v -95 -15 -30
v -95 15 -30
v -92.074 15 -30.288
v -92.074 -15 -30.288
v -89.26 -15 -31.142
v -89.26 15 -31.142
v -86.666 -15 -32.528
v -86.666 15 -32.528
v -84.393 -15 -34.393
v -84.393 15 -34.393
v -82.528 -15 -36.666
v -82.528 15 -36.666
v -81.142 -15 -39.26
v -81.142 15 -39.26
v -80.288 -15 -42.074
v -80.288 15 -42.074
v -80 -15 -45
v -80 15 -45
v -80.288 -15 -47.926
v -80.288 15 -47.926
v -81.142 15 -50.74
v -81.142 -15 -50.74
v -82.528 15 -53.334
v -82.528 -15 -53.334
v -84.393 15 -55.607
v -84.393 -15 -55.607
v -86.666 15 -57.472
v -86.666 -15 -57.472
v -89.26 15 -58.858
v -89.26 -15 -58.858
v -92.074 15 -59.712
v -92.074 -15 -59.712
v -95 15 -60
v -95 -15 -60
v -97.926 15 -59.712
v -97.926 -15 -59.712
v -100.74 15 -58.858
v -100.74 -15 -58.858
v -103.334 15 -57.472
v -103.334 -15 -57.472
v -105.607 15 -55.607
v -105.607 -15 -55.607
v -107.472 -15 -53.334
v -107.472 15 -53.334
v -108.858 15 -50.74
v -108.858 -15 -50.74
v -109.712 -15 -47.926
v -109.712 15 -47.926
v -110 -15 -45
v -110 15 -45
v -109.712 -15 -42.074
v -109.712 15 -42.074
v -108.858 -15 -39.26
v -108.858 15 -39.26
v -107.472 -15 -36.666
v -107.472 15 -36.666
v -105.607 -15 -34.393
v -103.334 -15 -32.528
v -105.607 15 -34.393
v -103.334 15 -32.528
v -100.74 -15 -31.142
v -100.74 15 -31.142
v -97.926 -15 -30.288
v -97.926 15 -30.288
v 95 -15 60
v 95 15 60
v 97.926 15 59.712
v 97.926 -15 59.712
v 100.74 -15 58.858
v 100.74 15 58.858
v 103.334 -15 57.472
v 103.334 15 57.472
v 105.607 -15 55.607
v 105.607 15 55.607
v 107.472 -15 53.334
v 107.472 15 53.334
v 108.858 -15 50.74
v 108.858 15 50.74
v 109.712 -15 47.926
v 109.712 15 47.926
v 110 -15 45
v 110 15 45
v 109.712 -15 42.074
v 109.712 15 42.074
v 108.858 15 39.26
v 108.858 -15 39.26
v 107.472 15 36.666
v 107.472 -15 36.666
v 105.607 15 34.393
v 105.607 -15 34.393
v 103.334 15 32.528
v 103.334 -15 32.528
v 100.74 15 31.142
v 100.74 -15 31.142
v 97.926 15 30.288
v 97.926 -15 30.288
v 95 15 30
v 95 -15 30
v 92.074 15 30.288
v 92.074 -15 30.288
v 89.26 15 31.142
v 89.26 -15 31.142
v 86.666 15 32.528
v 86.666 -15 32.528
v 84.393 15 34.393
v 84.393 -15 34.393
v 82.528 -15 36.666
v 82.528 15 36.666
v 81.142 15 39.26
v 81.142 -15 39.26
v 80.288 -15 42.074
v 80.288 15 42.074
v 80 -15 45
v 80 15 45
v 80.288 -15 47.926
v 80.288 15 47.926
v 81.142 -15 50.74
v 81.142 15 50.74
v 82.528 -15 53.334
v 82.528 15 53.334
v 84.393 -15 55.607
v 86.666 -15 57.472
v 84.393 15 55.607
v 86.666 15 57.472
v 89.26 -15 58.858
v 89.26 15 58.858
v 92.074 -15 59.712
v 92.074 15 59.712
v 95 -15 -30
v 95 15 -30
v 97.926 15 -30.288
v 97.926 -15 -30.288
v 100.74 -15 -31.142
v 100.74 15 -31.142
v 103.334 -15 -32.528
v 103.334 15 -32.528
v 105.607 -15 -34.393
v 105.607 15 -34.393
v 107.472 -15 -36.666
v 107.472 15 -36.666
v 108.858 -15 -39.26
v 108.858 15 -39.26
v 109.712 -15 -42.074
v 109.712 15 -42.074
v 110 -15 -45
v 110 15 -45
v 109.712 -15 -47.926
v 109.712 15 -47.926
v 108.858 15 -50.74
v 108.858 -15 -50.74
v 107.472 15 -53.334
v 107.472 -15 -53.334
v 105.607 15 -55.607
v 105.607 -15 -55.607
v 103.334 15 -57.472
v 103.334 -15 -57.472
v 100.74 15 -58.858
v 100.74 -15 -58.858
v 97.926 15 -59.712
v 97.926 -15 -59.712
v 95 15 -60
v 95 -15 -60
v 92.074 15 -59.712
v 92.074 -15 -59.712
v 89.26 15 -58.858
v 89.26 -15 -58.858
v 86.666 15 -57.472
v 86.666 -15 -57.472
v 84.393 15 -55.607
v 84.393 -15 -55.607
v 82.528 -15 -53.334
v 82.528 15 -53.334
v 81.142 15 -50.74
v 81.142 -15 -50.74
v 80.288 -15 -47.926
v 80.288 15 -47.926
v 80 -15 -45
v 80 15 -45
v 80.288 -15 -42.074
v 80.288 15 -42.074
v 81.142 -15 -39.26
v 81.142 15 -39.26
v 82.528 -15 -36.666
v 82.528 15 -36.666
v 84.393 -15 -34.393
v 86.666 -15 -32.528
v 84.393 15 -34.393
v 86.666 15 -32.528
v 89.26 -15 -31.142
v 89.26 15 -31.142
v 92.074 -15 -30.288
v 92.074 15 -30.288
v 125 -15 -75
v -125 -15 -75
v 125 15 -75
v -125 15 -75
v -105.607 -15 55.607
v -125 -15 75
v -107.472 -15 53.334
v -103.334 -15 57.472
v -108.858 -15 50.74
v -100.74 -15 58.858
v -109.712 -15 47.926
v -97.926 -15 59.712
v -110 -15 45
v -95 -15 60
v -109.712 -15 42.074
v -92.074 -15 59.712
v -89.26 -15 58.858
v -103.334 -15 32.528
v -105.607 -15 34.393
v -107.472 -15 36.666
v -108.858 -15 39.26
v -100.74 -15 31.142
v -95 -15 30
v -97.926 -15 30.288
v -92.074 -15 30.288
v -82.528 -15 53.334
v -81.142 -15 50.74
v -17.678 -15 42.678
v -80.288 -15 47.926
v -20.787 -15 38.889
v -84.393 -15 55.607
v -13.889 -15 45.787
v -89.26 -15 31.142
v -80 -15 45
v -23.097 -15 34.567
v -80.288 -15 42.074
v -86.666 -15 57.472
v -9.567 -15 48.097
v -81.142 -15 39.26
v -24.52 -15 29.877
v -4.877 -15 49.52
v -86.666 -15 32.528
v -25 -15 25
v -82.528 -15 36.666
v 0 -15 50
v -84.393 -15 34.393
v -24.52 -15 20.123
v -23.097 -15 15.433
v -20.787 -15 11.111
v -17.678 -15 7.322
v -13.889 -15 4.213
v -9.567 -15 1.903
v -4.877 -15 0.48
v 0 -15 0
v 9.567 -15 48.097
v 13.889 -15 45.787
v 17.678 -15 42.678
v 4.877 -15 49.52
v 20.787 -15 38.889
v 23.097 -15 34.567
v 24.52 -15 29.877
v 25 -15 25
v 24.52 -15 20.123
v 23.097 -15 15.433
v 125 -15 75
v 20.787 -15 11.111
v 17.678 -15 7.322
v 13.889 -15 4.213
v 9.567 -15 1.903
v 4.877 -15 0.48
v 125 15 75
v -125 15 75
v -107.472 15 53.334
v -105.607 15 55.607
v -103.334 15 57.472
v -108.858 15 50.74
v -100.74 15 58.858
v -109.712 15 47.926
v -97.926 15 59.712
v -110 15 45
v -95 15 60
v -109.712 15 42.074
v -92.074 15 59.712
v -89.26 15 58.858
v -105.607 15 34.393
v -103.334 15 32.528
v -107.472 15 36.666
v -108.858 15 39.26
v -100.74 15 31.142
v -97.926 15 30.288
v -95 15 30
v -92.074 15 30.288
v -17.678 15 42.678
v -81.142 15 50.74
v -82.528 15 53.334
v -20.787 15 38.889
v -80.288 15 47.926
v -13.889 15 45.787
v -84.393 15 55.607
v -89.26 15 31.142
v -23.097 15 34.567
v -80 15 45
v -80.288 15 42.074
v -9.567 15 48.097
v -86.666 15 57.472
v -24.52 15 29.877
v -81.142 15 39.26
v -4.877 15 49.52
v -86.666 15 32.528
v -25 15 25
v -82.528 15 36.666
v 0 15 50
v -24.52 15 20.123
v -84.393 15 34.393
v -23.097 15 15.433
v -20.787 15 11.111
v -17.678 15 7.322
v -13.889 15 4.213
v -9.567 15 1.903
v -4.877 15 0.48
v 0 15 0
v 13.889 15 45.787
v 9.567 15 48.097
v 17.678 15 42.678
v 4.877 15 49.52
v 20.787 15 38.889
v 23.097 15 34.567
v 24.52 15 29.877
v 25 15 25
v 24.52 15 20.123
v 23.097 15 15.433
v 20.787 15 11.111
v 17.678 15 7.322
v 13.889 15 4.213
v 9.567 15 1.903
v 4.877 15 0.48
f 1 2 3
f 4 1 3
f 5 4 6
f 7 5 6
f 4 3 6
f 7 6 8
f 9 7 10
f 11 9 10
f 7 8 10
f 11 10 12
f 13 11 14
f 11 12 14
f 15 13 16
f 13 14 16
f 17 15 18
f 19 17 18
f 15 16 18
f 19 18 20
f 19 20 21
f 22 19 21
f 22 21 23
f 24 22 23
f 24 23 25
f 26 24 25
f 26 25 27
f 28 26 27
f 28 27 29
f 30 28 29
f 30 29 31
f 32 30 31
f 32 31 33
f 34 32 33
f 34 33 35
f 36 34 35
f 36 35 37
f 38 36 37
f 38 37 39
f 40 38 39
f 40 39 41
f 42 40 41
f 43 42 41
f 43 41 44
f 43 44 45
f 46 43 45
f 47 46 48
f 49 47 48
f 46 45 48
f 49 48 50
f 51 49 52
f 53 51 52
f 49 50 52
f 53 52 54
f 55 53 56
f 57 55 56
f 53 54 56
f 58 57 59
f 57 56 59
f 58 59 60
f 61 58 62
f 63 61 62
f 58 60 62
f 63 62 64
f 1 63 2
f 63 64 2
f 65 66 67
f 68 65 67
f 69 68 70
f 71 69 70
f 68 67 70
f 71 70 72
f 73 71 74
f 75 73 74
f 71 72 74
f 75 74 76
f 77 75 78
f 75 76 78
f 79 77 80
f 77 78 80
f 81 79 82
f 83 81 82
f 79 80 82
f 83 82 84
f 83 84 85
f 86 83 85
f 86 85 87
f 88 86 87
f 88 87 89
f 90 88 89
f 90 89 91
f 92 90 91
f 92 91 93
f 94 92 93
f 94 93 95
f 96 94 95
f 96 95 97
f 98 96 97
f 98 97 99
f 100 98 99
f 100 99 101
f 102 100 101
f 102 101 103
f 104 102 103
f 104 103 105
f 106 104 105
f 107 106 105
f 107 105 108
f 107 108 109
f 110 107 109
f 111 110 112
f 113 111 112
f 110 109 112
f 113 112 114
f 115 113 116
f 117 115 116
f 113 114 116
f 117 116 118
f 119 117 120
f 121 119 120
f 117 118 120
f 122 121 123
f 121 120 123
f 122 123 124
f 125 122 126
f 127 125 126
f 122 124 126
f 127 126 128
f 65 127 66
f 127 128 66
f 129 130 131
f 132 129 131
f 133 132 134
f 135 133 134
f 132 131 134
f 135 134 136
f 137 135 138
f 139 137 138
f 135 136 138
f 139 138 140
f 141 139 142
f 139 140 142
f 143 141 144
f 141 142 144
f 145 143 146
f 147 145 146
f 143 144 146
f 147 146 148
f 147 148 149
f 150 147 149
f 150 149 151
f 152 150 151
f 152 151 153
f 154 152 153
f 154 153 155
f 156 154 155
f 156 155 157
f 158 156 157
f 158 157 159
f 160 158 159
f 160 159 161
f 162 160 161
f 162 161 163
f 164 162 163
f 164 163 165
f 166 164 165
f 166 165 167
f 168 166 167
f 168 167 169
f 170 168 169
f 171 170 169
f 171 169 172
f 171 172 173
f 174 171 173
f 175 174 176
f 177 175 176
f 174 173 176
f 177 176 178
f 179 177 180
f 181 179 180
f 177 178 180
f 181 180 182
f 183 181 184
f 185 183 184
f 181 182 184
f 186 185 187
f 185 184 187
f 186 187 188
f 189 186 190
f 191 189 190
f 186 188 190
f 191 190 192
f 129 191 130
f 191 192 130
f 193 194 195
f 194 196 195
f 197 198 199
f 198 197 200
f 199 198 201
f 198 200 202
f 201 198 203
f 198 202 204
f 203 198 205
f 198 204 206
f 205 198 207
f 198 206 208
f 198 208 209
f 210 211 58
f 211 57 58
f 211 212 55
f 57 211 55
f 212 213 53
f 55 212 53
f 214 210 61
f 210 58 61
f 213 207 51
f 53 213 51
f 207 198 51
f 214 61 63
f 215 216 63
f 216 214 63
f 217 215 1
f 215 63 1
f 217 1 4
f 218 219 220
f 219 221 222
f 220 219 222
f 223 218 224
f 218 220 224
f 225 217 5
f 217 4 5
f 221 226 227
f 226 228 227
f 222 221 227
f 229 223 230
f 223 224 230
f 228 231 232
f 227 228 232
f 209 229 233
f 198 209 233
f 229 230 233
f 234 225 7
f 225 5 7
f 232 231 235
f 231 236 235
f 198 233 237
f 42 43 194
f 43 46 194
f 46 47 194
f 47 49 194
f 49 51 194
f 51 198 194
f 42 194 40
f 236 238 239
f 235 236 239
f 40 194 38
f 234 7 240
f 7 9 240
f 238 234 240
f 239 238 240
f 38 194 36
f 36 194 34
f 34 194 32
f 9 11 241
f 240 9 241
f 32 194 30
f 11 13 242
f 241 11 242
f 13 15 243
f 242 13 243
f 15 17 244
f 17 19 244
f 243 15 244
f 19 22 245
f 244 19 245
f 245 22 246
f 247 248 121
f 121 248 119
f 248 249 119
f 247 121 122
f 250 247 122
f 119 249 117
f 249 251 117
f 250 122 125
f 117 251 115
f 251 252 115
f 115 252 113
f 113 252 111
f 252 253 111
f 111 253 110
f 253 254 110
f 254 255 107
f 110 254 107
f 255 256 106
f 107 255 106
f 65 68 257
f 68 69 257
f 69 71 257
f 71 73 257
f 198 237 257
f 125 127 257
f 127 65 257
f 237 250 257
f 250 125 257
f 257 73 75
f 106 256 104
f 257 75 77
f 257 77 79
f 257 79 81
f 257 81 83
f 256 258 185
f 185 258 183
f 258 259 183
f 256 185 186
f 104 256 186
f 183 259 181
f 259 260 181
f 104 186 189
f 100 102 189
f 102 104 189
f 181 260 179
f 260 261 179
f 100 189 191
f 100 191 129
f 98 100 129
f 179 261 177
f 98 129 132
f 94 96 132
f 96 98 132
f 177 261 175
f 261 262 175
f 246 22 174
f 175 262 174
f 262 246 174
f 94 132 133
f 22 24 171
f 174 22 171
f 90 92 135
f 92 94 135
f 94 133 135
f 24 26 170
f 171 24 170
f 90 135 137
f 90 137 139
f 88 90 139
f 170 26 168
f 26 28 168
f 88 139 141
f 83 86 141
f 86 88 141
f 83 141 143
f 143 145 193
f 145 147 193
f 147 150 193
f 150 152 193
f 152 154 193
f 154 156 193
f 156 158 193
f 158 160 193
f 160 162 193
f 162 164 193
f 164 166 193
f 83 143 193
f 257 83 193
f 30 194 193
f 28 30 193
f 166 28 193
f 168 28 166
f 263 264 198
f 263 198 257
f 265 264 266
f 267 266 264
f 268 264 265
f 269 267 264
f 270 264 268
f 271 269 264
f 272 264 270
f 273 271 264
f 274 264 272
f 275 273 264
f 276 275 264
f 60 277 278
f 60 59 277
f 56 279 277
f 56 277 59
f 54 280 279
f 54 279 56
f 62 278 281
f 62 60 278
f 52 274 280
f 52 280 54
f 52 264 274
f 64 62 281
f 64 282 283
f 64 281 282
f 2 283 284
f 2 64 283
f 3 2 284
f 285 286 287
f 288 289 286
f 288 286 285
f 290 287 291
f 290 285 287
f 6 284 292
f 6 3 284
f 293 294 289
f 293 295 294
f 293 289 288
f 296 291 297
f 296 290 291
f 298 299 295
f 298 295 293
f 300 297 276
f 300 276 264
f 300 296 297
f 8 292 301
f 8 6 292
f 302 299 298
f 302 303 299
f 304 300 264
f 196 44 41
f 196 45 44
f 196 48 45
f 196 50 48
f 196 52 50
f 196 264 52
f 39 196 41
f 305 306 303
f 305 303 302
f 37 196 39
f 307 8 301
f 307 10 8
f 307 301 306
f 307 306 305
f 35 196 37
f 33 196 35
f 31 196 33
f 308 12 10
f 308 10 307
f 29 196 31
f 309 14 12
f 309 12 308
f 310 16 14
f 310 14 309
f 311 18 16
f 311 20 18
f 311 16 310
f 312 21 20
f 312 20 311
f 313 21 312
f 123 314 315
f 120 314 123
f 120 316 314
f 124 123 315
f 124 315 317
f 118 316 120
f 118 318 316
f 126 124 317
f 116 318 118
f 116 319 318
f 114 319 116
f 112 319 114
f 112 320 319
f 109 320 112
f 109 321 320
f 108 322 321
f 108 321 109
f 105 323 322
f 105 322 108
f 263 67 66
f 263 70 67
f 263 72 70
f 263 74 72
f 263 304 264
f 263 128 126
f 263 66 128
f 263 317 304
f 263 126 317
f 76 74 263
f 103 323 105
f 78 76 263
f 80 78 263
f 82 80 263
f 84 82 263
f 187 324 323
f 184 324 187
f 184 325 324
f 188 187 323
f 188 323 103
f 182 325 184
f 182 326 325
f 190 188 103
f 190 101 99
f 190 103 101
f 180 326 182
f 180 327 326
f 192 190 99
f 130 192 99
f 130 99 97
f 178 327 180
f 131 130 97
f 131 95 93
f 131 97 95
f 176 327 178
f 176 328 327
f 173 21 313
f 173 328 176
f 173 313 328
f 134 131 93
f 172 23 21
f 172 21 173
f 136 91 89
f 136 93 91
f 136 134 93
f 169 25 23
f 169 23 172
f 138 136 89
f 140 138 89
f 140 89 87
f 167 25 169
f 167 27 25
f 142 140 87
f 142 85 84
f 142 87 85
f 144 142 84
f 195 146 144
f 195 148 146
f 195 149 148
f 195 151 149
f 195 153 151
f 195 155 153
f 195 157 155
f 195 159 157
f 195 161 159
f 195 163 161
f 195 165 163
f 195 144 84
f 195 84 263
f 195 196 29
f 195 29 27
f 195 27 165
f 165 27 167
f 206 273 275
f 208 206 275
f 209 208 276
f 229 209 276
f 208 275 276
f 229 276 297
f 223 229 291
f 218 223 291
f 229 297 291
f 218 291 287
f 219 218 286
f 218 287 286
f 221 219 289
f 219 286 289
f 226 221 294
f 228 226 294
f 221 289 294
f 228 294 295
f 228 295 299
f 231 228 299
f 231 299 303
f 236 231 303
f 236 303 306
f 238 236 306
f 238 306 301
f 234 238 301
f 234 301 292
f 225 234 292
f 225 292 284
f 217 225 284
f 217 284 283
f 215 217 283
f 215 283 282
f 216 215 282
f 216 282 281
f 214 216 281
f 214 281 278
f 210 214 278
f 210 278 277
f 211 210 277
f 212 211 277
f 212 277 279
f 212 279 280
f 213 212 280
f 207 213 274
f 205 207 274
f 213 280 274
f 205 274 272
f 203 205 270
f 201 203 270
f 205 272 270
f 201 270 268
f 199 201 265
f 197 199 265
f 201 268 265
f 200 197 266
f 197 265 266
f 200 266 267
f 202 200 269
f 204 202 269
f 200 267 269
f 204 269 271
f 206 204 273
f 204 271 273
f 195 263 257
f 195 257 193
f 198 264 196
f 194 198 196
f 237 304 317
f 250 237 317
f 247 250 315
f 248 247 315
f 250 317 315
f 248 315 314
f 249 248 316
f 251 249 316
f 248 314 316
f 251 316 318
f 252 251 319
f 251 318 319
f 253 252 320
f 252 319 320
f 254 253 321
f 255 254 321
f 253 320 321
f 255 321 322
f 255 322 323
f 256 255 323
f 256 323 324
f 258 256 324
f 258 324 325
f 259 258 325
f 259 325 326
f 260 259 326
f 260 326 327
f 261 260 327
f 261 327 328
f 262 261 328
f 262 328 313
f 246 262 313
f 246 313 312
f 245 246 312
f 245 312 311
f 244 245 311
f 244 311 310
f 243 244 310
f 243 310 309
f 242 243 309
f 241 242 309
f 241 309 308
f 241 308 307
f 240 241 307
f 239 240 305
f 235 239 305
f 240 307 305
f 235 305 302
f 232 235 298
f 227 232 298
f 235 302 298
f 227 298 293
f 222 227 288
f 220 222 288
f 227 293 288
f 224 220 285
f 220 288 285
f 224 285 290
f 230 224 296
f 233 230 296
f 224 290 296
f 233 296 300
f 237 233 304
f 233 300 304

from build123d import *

# Parameters (mm, degrees)
SKETCH3_W           = 250
SKETCH3_H           = 150
BOSS_EXTRUDE2_DEPTH = 15
SKETCH5_R           = 25
CUT_EXTRUDE1_DEPTH  = 149.828760661
SKETCH6_R           = 15
CUT_EXTRUDE2_DEPTH  = 149.828760661


with BuildPart() as part:
    # Sketch3 → Boss-Extrude2 (new, symmetric)
    with BuildSketch(Plane(origin=(0, 0, 0), x_dir=(1, 0, 0), z_dir=(0, 1, 0))):
        Rectangle(SKETCH3_W, SKETCH3_H)
    extrude(amount=BOSS_EXTRUDE2_DEPTH, both=True)

    # Sketch5 → Cut-Extrude1 (cut, through all)
    with BuildSketch(Plane(origin=(0, 15, 0), x_dir=(1, 0, 0), z_dir=(0, 1, 0))):
        with Locations(Location((0, -25, 0), (0, 0, 270))):
            Circle(SKETCH5_R)
    extrude(amount=-CUT_EXTRUDE1_DEPTH, mode=Mode.SUBTRACT)

    # Sketch6 → Cut-Extrude2 (cut, through all)
    with BuildSketch(Plane(origin=(0, 15, 0), x_dir=(1, 0, 0), z_dir=(0, 1, 0))):
        with Locations(Location((-95, -45, 0), (0, 0, 270))):
            Circle(SKETCH6_R)
        with Locations(Location((95, -45, 0), (0, 0, 270))):
            Circle(SKETCH6_R)
        with Locations(Location((95, 45, 0), (0, 0, 270))):
            Circle(SKETCH6_R)
        with Locations(Location((-95, 45, 0), (0, 0, 270))):
            Circle(SKETCH6_R)
    extrude(amount=-CUT_EXTRUDE2_DEPTH, mode=Mode.SUBTRACT)


solid = part.part
